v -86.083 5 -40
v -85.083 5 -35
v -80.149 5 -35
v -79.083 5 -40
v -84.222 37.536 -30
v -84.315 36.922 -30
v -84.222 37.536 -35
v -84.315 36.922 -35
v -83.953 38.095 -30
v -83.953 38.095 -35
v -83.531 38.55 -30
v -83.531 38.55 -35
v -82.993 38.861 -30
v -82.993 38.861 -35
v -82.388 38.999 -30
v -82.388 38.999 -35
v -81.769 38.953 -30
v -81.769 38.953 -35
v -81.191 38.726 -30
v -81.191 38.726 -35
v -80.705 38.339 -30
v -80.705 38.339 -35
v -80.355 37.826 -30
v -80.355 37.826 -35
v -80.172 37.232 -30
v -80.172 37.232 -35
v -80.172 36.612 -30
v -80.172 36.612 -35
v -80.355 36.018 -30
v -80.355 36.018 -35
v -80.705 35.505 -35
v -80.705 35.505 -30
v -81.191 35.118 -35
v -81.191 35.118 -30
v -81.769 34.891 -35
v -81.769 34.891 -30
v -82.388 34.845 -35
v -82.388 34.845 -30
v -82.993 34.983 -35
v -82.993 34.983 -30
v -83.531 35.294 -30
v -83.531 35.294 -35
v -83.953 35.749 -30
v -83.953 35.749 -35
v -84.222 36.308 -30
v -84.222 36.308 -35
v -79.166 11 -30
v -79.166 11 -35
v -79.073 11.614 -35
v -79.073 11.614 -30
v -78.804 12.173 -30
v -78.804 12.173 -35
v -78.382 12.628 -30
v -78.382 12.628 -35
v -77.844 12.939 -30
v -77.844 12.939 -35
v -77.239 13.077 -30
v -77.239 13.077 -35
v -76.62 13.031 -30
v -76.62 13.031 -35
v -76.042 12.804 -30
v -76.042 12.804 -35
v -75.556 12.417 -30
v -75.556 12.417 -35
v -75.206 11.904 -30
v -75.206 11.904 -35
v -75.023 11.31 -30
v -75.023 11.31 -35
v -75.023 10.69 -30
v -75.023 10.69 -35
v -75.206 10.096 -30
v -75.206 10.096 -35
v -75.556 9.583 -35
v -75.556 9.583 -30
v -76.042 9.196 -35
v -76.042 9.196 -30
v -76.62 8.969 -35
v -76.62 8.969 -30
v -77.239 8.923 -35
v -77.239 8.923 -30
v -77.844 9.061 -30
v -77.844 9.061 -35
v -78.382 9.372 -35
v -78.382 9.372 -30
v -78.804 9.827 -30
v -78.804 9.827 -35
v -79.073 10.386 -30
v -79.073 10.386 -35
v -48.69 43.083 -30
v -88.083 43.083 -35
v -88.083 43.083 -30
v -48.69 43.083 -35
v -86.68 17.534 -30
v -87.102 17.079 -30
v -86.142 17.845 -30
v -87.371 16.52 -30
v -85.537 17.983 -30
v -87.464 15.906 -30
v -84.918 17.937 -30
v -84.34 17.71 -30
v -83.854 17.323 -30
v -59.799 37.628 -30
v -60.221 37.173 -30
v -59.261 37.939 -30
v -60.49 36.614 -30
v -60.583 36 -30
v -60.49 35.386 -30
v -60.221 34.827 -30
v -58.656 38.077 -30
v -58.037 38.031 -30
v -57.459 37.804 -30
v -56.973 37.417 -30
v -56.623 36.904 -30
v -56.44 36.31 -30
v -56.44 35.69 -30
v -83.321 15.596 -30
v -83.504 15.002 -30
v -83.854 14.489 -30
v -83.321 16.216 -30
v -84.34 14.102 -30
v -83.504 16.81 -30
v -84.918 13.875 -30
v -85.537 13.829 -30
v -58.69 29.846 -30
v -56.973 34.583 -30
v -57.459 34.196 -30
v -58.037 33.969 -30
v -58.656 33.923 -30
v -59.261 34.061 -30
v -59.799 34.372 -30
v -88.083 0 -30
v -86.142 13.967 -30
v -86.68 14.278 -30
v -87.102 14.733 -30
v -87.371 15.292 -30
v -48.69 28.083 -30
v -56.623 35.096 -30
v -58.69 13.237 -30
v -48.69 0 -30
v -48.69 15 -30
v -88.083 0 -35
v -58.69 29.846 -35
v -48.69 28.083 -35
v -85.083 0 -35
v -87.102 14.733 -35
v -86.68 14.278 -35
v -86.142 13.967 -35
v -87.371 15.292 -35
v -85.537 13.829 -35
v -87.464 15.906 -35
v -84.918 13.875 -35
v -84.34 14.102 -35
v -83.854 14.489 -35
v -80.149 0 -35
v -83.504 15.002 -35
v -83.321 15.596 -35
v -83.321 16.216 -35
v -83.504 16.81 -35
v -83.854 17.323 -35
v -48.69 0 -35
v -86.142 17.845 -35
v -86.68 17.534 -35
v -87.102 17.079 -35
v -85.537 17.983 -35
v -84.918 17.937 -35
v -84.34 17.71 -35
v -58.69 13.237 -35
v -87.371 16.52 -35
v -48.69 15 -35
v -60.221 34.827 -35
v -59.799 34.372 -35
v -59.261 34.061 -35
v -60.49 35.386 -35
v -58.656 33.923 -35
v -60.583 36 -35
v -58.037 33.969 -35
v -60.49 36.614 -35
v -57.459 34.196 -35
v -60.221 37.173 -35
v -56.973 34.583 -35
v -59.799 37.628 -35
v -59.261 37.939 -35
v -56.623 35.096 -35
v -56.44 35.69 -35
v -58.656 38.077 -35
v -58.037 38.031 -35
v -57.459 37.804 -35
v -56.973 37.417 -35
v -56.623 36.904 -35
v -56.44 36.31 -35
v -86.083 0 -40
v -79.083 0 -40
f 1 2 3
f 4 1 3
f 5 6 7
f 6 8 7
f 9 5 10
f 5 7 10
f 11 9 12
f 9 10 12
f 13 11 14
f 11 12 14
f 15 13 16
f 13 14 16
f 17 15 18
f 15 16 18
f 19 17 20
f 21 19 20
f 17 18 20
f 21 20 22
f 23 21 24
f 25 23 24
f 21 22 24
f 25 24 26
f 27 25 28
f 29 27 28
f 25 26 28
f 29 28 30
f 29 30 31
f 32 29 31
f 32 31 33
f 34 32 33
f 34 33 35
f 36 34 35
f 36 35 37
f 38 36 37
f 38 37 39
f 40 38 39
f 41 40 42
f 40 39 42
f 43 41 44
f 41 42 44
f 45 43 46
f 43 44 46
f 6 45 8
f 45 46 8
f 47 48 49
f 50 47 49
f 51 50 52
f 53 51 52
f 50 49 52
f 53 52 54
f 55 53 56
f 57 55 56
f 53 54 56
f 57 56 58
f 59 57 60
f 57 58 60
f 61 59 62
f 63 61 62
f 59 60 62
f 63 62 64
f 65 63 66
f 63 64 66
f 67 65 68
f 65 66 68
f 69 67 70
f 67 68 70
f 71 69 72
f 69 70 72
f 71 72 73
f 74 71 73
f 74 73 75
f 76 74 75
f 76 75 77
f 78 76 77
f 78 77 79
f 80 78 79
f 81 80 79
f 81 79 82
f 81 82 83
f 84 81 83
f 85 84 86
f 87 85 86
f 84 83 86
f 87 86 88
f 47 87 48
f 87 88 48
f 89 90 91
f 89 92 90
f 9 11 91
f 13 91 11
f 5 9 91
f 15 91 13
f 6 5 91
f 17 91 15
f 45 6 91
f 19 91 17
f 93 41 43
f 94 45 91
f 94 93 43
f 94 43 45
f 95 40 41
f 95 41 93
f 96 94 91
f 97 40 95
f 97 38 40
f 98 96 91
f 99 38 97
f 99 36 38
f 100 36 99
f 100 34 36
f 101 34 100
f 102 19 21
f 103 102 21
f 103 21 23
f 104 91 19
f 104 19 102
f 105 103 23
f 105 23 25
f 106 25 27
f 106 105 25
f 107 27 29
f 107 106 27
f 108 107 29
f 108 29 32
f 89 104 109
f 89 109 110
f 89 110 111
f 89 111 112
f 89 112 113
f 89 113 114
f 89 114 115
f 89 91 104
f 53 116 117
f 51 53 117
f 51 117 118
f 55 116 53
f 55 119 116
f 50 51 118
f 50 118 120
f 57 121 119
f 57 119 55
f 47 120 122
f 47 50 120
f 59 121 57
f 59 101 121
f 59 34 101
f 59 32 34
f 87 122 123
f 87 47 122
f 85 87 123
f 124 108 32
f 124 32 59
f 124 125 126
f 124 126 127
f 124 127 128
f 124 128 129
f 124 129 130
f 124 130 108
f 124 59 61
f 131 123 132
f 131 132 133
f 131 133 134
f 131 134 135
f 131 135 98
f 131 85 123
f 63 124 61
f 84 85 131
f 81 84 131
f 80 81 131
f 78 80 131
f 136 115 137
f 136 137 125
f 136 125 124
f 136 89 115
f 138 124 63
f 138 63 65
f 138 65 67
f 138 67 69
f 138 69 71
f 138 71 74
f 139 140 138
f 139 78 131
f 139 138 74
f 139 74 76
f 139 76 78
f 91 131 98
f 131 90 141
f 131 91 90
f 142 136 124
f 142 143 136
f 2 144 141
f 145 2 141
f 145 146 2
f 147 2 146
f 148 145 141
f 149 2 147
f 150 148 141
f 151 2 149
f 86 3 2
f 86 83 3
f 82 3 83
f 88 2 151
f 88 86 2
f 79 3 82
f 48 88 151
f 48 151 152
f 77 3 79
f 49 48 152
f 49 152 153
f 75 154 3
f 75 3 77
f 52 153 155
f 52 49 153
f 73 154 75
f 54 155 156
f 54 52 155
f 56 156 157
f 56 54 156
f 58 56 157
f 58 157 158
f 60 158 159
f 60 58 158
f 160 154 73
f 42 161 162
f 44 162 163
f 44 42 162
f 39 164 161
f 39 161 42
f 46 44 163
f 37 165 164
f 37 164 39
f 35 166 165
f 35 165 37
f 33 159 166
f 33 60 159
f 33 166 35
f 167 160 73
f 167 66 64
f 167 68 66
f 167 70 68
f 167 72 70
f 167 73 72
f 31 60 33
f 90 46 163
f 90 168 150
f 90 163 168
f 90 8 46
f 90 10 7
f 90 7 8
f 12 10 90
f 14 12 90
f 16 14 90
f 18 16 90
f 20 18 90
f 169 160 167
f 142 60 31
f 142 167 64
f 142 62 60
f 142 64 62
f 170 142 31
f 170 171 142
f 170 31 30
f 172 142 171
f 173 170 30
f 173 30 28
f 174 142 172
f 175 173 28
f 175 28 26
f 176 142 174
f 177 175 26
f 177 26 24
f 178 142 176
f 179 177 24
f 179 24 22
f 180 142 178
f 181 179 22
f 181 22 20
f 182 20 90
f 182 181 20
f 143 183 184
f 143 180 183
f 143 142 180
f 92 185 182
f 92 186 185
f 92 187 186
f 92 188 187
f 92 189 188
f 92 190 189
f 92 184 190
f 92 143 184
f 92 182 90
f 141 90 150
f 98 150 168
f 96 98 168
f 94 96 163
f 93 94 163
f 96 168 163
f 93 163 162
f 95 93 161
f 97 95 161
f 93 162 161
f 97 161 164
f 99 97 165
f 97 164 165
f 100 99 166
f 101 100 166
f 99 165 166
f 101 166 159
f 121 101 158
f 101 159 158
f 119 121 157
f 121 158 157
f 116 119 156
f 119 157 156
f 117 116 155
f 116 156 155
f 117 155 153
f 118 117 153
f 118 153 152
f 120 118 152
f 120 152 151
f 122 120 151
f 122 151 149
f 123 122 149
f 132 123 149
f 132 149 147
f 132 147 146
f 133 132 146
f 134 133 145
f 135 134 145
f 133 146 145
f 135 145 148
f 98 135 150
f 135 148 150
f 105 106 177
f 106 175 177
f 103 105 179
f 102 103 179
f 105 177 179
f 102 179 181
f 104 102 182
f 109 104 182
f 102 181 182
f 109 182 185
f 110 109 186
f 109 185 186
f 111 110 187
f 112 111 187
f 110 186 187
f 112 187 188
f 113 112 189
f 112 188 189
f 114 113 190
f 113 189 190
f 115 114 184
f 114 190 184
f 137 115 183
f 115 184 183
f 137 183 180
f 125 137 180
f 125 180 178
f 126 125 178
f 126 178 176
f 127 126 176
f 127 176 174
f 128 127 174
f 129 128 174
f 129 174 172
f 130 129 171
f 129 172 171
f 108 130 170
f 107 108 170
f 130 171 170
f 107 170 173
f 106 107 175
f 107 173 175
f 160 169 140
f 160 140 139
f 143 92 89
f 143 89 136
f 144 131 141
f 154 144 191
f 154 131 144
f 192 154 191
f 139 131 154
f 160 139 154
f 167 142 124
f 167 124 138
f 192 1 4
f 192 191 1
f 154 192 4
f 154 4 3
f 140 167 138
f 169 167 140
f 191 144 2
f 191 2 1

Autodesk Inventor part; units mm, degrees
ref_plane "YZ Plane" through (0, 0, 0) normal (1, 0, 0) x (0, 1, 0)
ref_plane "XZ Plane" through (0, 0, 0) normal (0, 1, 0) x (-1, 0, 0)
ref_plane "XY Plane" through (0, 0, 0) normal (0, 0, 1) x (1, 0, 0)
sketch "Sketch1" plane through (0, 0, 0) normal (0, 1, 0) x (-1, 0, 0)
  line L0 (0, 0) -> (0, -35)
  line L1 (0, -35) -> (37, -35)
  line L2 (37, -35) -> (37, -55)
  line L3 (37, -55) -> (48, -55)
  line L4 (48, -55) -> (48, 0)
  line L5 (48, 0) -> (22, 0)
  line L6 (22, 0) -> (22, 0)
  line L7 (22, 0) -> (0, 0)
  dimension "d0" = 35
  dimension "d1" = 37
  dimension "d2" = 20
  dimension "d3" = 11
  dimension "d4" = 55
  dimension "d5" = 26
  dimension "d6" = 0
extrude "Extrusion1" add sketch "Sketch1" along normal blind 50
shell "Shell1" thickness 5 removed faces 3 at (-48, 16.6667, -36.6667) at (-19.6667, 0, -23.3333) at (-19.6667, 50, -23.3333)
sketch "Sketch2" plane through (0, 0, 0) normal (1, 0, 0) x (0, 0, -1)
  line L0 (5, 0) -> (30, 0) projected
  line L1 (5, 0) -> (19, 0)
  line L2 (19, 0) -> (19, 17)
  line L3 (19, 17) -> (5, 17)
  line L4 (5, 17) -> (5, 0)
  point P0 (0, 0)
  dimension "d10" = 17
  dimension "d11" = 0
  dimension "d12" = 11
extrude "Extrusion2" cut sketch "Sketch2" against normal blind 10
sketch "Sketch3" plane through (-48, 0, -55) normal (-1, 0, 0) x (0, 0, 1)
  line L0 (0, 0) -> (0, 50) projected
  line L1 (5, 50) -> (25, 50) projected
  line L2 (0, 0) -> (5, 0)
  line L3 (5, 0) -> (5, 50)
  line L4 (5, 50) -> (0, 50)
  line L5 (0, 50) -> (0, 0)
  point P0 (55, 0)
extrude "Extrusion3" add sketch "Sketch3" along normal blind 15
sketch "Sketch4" plane through (-48, 0, 0) normal (-1, 0, 0) x (0, 0, 1)
  line L0 (-5, 0) -> (0, 0) projected
  line L1 (-5, 0) -> (-5, 50) projected
  line L2 (0, 0) -> (-5, 0)
  line L3 (-5, 0) -> (-5, 50)
  line L4 (-5, 50) -> (0, 50)
  line L5 (0, 50) -> (0, 0)
  point P0 (0, 0)
extrude "Extrusion4" add sketch "Sketch4" along normal blind 15
sketch "Sketch5" plane through (0, 17, -5) normal (0, 0, -1) x (-1, 0, 0)
  circle A0 centre (11.5, -8.5) radius 2.0828
  line L0 (63, -17) -> (0, -17) projected
  line L1 (0, -17) -> (0, 0) projected
  dimension "d19" = 4.1656
  dimension "d20" = 8.5
  dimension "d21" = 11.5
extrude "Extrusion5" cut sketch "Sketch5" against normal blind 15
sketch "Sketch6" plane through (0, 17, -5) normal (0, 0, -1) x (-1, 0, 0)
  circle A0 centre (28.505, 18.46) radius 2.0828
  line L0 (63, -17) -> (0, -17) projected
  line L1 (5, 0) -> (5, 33) projected
  dimension "d24" = 4.1656
  dimension "d25" = 35.46
  dimension "d26" = 23.505
extrude "Extrusion6" cut sketch "Sketch6" against normal blind 15
sketch "Sketch7" plane through (0, 17, -5) normal (0, 0, -1) x (-1, 0, 0)
  circle A0 centre (58.5, 19) radius 2.0828
  line L0 (63, 33) -> (63, -17) projected
  line L1 (5, 33) -> (63, 33) projected
  point P0 (0, -17)
  dimension "d29" = 4.1656
  dimension "d30" = 4.5
  dimension "d31" = 14
extrude "Extrusion7" cut sketch "Sketch7" against normal blind 15
sketch "Sketch13" plane through (0, 0, -35) normal (0, 0, -1) x (-1, 0, 0)
  circle A0 centre (11.5, 8.5) radius 2.0828
  line L0 (0, 0) -> (37, 0) projected
  line L1 (0, 0) -> (0, 50) projected
  dimension "d41" = 4.1656
  dimension "d42" = 8.5
  dimension "d43" = 11.5
extrude "Extrusion9" cut sketch "Sketch13" against normal blind 15
sketch "Sketch14" plane through (-37, 0, -55) normal (0, 0, -1) x (-1, 0, 0)
  circle A0 centre (-8.495, 35.46) radius 2.0828
  line L0 (-37, 0) -> (-37, 50) projected
  line L1 (0, 0) -> (26, 0) projected
  dimension "d46" = 4.1656
  dimension "d47" = 28.505
  dimension "d48" = 35.46
extrude "Extrusion10" cut sketch "Sketch14" against normal blind 15
sketch "Sketch15" plane through (-37, 0, -55) normal (0, 0, -1) x (-1, 0, 0)
  circle A0 centre (21.5, 36) radius 2.0828
  line L0 (0, 0) -> (26, 0) projected
  line L1 (26, 50) -> (26, 0) projected
  point P0 (-37, 0)
  dimension "d51" = 4.1656
  dimension "d52" = 36
  dimension "d53" = 4.5
extrude "Extrusion11" cut sketch "Sketch15" against normal blind 15
sketch "Sketch16" plane through (-42, 0, -30) normal (-1, 0, 0) x (0, 0, 1)
  line L0 (0, 0) -> (-5, 0)
  line L1 (-5, 0) -> (-5, 50)
  line L2 (-5, 50) -> (0, 50)
  line L3 (0, 50) -> (0, 0)
  point P0 (30, 0)
  dimension "d56" = 5
  dimension "d57" = 50
extrude "Extrusion12" add sketch "Sketch16" along normal blind 21
sketch "Sketch17" plane through (-5, 0, -30) normal (0, 0, 1) x (1, 0, 0)
  circle A0 centre (-23.505, 35.46) radius 2.0828
  line L0 (0, 0) -> (0, 50) projected
  line L1 (0, 0) -> (-58, 0) projected
  point P0 (5, 0)
  dimension "d60" = 4.1656
  dimension "d61" = 23.505
  dimension "d62" = 35.46
extrude "Extrusion13" cut sketch "Sketch17" against normal blind 10
sketch "Sketch18" plane through (-42, 0, -35) normal (0, 0, -1) x (-1, 0, 0)
  circle A0 centre (16.5, 36) radius 2.0828
  line L0 (21, 50) -> (21, 0) projected
  line L1 (0, 0) -> (21, 0) projected
  point P0 (-42, 0)
  dimension "d65" = 4.1656
  dimension "d67" = 36
  dimension "d70" = 4.5
extrude "Extrusion14" cut sketch "Sketch18" against normal blind 10
sketch "Sketch20" plane through (-63, 0, 0) normal (-1, 0, 0) x (0, 0, 1)
  line L0 (0, 0) -> (-5, 0) projected
  line L1 (-5, 17) -> (-5, 50) projected
  line L2 (0, 0) -> (-5, 0)
  line L3 (-5, 0) -> (-5, 50)
  line L4 (-5, 50) -> (0, 50)
  line L5 (0, 50) -> (0, 0)
extrude "Extrusion15" add sketch "Sketch20" along normal blind 2.583
sketch "Sketch21" plane through (-63, 0, -30) normal (-1, 0, 0) x (0, 0, 1)
  line L0 (-20, 50) -> (-5, 50) projected
  line L1 (11, 0) -> (0, 0) projected
  line L2 (-5, 50) -> (0, 50)
  line L3 (0, 50) -> (0, 0)
  line L4 (0, 0) -> (-5, 0)
  line L5 (-5, 0) -> (-5, 50)
  point P0 (30, 0)
extrude "Extrusion16" add sketch "Sketch21" along normal blind 2.583
sketch "Sketch22" plane through (-63, 0, -55) normal (-1, 0, 0) x (0, 0, 1)
  line L0 (0, 0) -> (0, 50) projected
  line L1 (5, 0) -> (5, 50) projected
  line L2 (0, 50) -> (5, 50)
  line L3 (5, 50) -> (5, 0)
  line L4 (5, 0) -> (0, 0)
  line L5 (0, 0) -> (0, 50)
  point P0 (55, 0)
extrude "Extrusion17" add sketch "Sketch22" along normal blind 2.583
sketch "Sketch23" plane through (0, 0, 0) normal (0, 0, 1) x (1, 0, 0)
  line L0 (0, 50) -> (-37, 50) projected
  line L1 (-65.583, 50) -> (-65.583, 0) projected
  line L2 (0, 50) -> (-65.583, 50)
  line L3 (-65.583, 50) -> (-65.583, 43.083)
  line L4 (-65.583, 43.083) -> (0, 43.083)
  line L5 (0, 43.083) -> (0, 50)
  point P0 (0, 0)
  dimension "d77" = 6.917
extrude "Extrusion18" cut sketch "Sketch23" against normal blind 100
sketch "Sketch24" plane through (0, 0, -35) normal (0, 0, -1) x (-1, 0, 0)
  line L0 (0, 0) -> (65.583, 0) projected
  line L1 (31.0052, 0) -> (26.0052, 0)
  line L2 (26.0052, 5) -> (31.0052, 5)
  circle A0 centre (28.505, 35.46) radius 2.0828 projected
  line L3 (26.0052, 5) -> (25.0052, 5)
  line L4 (25.0052, 5) -> (26.0052, 0)
  line L5 (31.0052, 5) -> (32.0052, 5)
  line L6 (32.0052, 5) -> (31.0052, 0)
  dimension "d80" = 5
  dimension "d81" = 5
  dimension "d83" = 1
  dimension "d84" = 1
extrude "Extrusion19" cut sketch "Sketch24" against normal blind 100 contours L4 L3 L2 L5 L6 L0
sketch "Sketch25" plane through (-65.583, 0, -55) normal (-1, 0, 0) x (0, 0, 1)
  line L0 (20, 0) -> (0, 0) projected
  line L1 (0, 43.083) -> (20, 43.083) projected
  line L2 (0, 0) -> (5, 0)
  line L3 (5, 0) -> (5, 43.083)
  line L4 (5, 43.083) -> (0, 43.083)
  line L5 (0, 43.083) -> (0, 0)
  point P0 (55, 0)
  dimension "d87" = 5
extrude "Extrusion20" add sketch "Sketch25" along normal blind 22.5
sketch "Sketch28" plane through (-65.583, 0, -30) normal (-1, 0, 0) x (0, 0, 1)
  line L0 (0, 0) -> (-5, 0) projected
  line L1 (-5, 0) -> (-5, 43.083) projected
  line L2 (0, 0) -> (-5, 0)
  line L3 (-5, 0) -> (-5, 43.083)
  line L4 (-5, 43.083) -> (0, 43.083)
  line L5 (0, 43.083) -> (0, 0)
  point P0 (30, 0)
extrude "Extrusion23" add sketch "Sketch28" along normal blind 22.5
sketch "Sketch26" plane through (-37, 0, -55) normal (0, 0, -1) x (-1, 0, 0)
  circle A0 centre (45.232, 36.922) radius 2.0828
  line L0 (51.083, 43.083) -> (51.083, 0) projected
  line L1 (51.083, 43.083) -> (0, 43.083) projected
  point P0 (-37, 0)
  dimension "d90" = 4.1656
  dimension "d91" = 5.851
  dimension "d92" = 6.161
extrude "Extrusion21" cut sketch "Sketch26" against normal blind 25
sketch "Sketch27" plane through (-37, 0, -55) normal (0, 0, -1) x (-1, 0, 0)
  circle A0 centre (48.381, 15.906) radius 2.0828
  line L0 (51.083, 43.083) -> (51.083, 0) projected
  line L1 (0, 0) -> (51.083, 0) projected
  point P0 (-37, 0)
  dimension "d95" = 4.1656
  dimension "d96" = 2.702
  dimension "d97" = 15.906
extrude "Extrusion22" cut sketch "Sketch27" against normal blind 25
sketch "Sketch29" plane through (-42, 0, -35) normal (0, 0, -1) x (-1, 0, 0)
  circle A0 centre (43.381, 15.906) radius 2.0828 projected
  arc A1 (46.083, 19.6075) -> (46.083, 12.2045) centre (43.381, 15.906) ccw
  line L0 (46.083, 43.083) -> (46.083, 0) projected
  line L1 (46.083, 19.6075) -> (46.083, 12.2045)
  point P0 (-42, 0)
  dimension "d102" = 2.5
extrude "Extrusion24" add sketch "Sketch29" along normal up to next
sketch "Sketch30" plane through (-88.083, 0, -55) normal (-1, 0, 0) x (0, 0, 1)
  line L0 (9, 19.6075) -> (21, 19.6075)
  line L1 (21, 19.6075) -> (21, 5)
  line L2 (21, 5) -> (9, 5)
  line L3 (9, 5) -> (9, 19.6075)
  line L4 (0, 43.083) -> (0, 0) projected
  line L5 (25, 0) -> (25, 43.083) projected
  line L6 (0, 0) -> (5, 0) projected
  line L7 (20, 19.6075) -> (5, 19.6075) projected
  point P0 (55, 0)
  dimension "d105" = 9
  dimension "d106" = 4
  dimension "d107" = 5
  dimension "d108" = 0
extrude "Extrusion25" add sketch "Sketch30" along normal blind 30
sketch "Sketch31" plane through (-88.083, 5, -34) normal (0, 0, 1) x (1, 0, 0)
  circle A0 centre (-23.917, 4) radius 2.0828
  line L0 (-30, 0) -> (-30, 14.6075) projected
  line L1 (0, 0) -> (-30, 0) projected
  point P0 (88.083, -5)
  dimension "d111" = 4.1656
  dimension "d112" = 6.083
  dimension "d113" = 4
extrude "Extrusion26" cut sketch "Sketch31" against normal blind 30
sketch "Sketch33" plane through (-88.083, 5, -34) normal (0, 0, 1) x (1, 0, 0)
  circle A0 centre (-23.917, 4) radius 2.0828 projected
  arc A1 (-25.0228, 9.9816) -> (-30, 4) centre (-23.917, 4) ccw
  line L0 (-30, 14.6075) -> (-30, 0) projected
  line L1 (-30, 0) -> (-30, 14.6075) projected
  line L2 (0, 14.6075) -> (-30, 14.6075) projected
  line L3 (-30, 4) -> (-30, 14.6075)
  line L4 (0, 14.6075) -> (-30, 14.6075) projected
  line L5 (-30, 14.6075) -> (0, 14.6075)
  line L6 (0, 14.6075) -> (-25.0228, 9.9816)
  point P0 (88.083, -5)
extrude "Extrusion27" cut sketch "Sketch33" against normal blind 30 contours A1 L0 L2 L6
sketch "Sketch34" plane through (-118.083, 5, -34) normal (0, 0, 1) x (1, 0, 0)
  circle A0 centre (6.083, 4) radius 2.0828 projected
  line L0 (0, 0) -> (0, 4) projected
  arc A1 (0, 4) -> (1.5001, 0) centre (6.083, 4) ccw
  line L1 (30, 0) -> (0, 0) projected
  line L2 (1.5001, 0) -> (0, 0)
  arc A2 (4.9772, 9.9816) -> (0, 4) centre (6.083, 4) ccw projected
  line L3 (0, 0) -> (0, 4)
  point P0 (118.083, -5)
extrude "Extrusion28" cut sketch "Sketch34" against normal blind 30 contours L0 A1 L1
sketch "Sketch35" plane through (-88.083, 5, -46) normal (0, -1, 0) x (1, 0, 0)
  line L0 (0, 12) -> (0, 11) projected
  line L1 (0, 0) -> (-28.4999, 0) projected
  line L2 (0, 11) -> (0, 0)
  line L3 (0, 0) -> (7.2848, 11)
  line L4 (7.2848, 11) -> (7.2848, -4) projected
  line L5 (0, 11) -> (7.2848, 11)
  line L6 (46.083, 11) -> (0, 11) projected
  point P0 (88.083, 46)
extrude "Extrusion29" add sketch "Sketch35" against normal up to next
sketch "Sketch36" plane through (0, 0, 0) normal (1, 0, 0) x (0, 0, -1)
  line L0 (30, 43.083) -> (35, 43.083) projected
  line L1 (0, 0) -> (5, 0) projected
  line L2 (30, 43.083) -> (0, 43.083)
  line L3 (0, 43.083) -> (0, 0)
  line L4 (0, 0) -> (30, 0)
  line L5 (30, 0) -> (30, 43.083)
extrude "Extrusion30" cut sketch "Sketch36" against normal through all
sketch "Sketch37" plane through (0, 43.083, -35) normal (0, 0, -1) x (-1, 0, 0)
  line L0 (10, -8.694) -> (10, -17.3883)
  line L1 (10, -17.3883) -> (5, -16.5067)
  line L2 (10, -8.694) -> (5, -9.5756)
  line L3 (10, -8.694) -> (15.0771, -8.694) construction
  line L4 (5, -9.5756) -> (5, -16.5067)
  line L5 (0, -43.083) -> (0, 0) projected
  line L6 (0, -43.083) -> (26.0052, -43.083) projected
  dimension "d124" = 8.6943
  dimension "d125" = 80
  dimension "d126" = 170
  dimension "d127" = 5
  dimension "d130" = 5
  dimension "d131" = 34.389
extrude "Extrusion31" cut sketch "Sketch37" against normal blind 10
sketch "Sketch38" plane through (-37, 0, -35) normal (1, 0, 0) x (0, 0, -1)
  line L0 (20, 43.083) -> (20, 0) projected
  line L1 (0, 0) -> (20, 0)
  line L2 (20, 0) -> (20, 43.083)
  line L3 (20, 43.083) -> (0, 43.083)
  line L4 (0, 43.083) -> (0, 0)
  point P0 (-35, 0)
extrude "Extrusion32" cut sketch "Sketch38" against normal through all
sketch "Sketch39" plane through (0, 0, -30) normal (1, 0, 0) x (0, 0, -1)
  line L0 (10, 34.389) -> (10, 25.6947)
  line L1 (10, 25.6947) -> (5, 26.5763)
  line L2 (10, 34.389) -> (5, 33.5074)
  line L3 (10, 34.389) -> (15.0771, 34.389) construction
  line L4 (5, 33.5074) -> (5, 26.5763)
  line L5 (5, 0) -> (5, 43.083) projected
  point P0 (5, 33.5074)
  dimension "d136" = 8.6943
  dimension "d137" = 80
  dimension "d138" = 170
  dimension "d139" = 5
  dimension "d140" = 0
  dimension "d141" = 8.694
extrude "Extrusion33" add sketch "Sketch39" against normal blind 37
sketch "Sketch40" plane through (0, 0, -30) normal (1, 0, 0) x (0, 0, -1)
  line L0 (5, 38.0828) -> (5, 33.9172) projected
  line L1 (5, 36.5278) -> (10.9453, 36.5278)
  line L2 (10.9453, 36.5278) -> (10.9453, 22.5092)
  line L3 (10.9453, 22.5092) -> (5, 22.5092)
  line L4 (5, 22.5092) -> (5, 36.5278)
  point P0 (-30, 0)
extrude "Extrusion34" cut sketch "Sketch40" against normal blind 32
sketch "Sketch41" plane through (0, 0, -35) normal (0, 0, -1) x (-1, 0, 0)
  line L0 (0, 0) -> (5, 0)
  line L1 (5, 0) -> (5, 45.0451)
  line L2 (5, 45.0451) -> (0, 45.0451)
  line L3 (0, 45.0451) -> (0, 0)
  dimension "d146" = 5
extrude "Extrusion35" cut sketch "Sketch41" against normal blind 27
sketch "Sketch43" plane through (-32, 0, -30) normal (1, 0, 0) x (0, 0, -1)
  line L0 (10, 16.9997) -> (10, 8.3054)
  line L1 (10, 8.3054) -> (5, 9.187)
  line L2 (10, 16.9997) -> (5, 16.118)
  line L3 (10, 16.9997) -> (15.0771, 16.9997) construction
  line L4 (5, 16.118) -> (5, 9.187)
  line L5 (10, 34.389) -> (10, 25.6947) projected
  point P0 (5, 0)
  dimension "d149" = 8.6943
  dimension "d150" = 80
  dimension "d151" = 170
  dimension "d152" = 5
  dimension "d153" = 0
  dimension "d154" = 9.187
extrude "Extrusion36" add sketch "Sketch43" against normal blind 5
sketch "Sketch44" plane through (-25.0052, 5, -35) normal (0, 0, -1) x (-1, 0, 0)
  line L0 (23.6844, 38.083) -> (23.6844, 23.083)
  line L1 (23.6844, 23.083) -> (33.6844, 24.8463)
  line L2 (33.6844, 24.8463) -> (33.6844, 8.2367)
  line L3 (33.6844, 8.2367) -> (23.6844, 10)
  line L4 (23.6844, 10) -> (23.6844, -5)
  line L5 (6, -5) -> (63.0778, -5) projected
  line L6 (63.0778, 38.083) -> (-20.0052, 38.083) projected
  line L7 (23.6844, 38.083) -> (96.1703, 54.1884)
  line L8 (96.1703, 54.1884) -> (94.0332, -32.3639)
  line L9 (94.0332, -32.3639) -> (23.6844, -5)
  point P0 (-25.0052, -5)
  dimension "d157" = 15
  dimension "d158" = 15
  dimension "d159" = 13.083
  dimension "d160" = 80
  dimension "d161" = 80
  dimension "d162" = 10
extrude "Extrusion37" cut sketch "Sketch44" against normal blind 10 keep common part
sketch "Sketch45" plane through (-88.083, 0, -35) normal (0, 0, -1) x (-1, 0, 0)
  line L0 (-39.3934, 0) -> (0, 0) projected
  line L1 (0, 0) -> (31.1336, 0)
  line L2 (31.1336, 0) -> (31.1336, 42.5883)
  line L3 (31.1336, 42.5883) -> (0, 42.5883)
  line L4 (0, 42.5883) -> (0, 0)
  point P0 (-88.083, 0)
extrude "Extrusion38" cut sketch "Sketch45" against normal blind 10
sketch "Sketch46" plane through (-88.083, 0, -35) normal (0, 0, -1) x (-1, 0, 0)
  circle A0 centre (-11, 11) radius 2.0828
  line L0 (-39.3934, 0) -> (0, 0) projected
  line L1 (0, 43.083) -> (0, 0) projected
  point P0 (-88.083, 0)
  dimension "d167" = 4.1656
  dimension "d168" = 11
  dimension "d169" = 11
extrude "Extrusion39" cut sketch "Sketch46" against normal blind 10
sketch "Sketch47" plane through (0, 0, 0) normal (0, -1, 0) x (1, 0, 0)
  line L0 (-87.4638, -35) -> (-83.2982, -35) projected
  line L1 (-85.083, -35) -> (-86.083, -40)
  line L2 (-86.083, -40) -> (-79.083, -40)
  line L3 (-80.1492, -35) -> (-84.3148, -35) projected
  line L4 (-79.083, -40) -> (-80.1492, -35)
  line L5 (-80.1492, -35) -> (-85.083, -35)
  line L6 (-48.6896, -35) -> (-88.083, -35) projected
  point P0 (0, 0)
  dimension "d172" = 3
  dimension "d173" = 1
  dimension "d174" = 7
  dimension "d175" = 5
extrude "Extrusion40" add sketch "Sketch47" against normal blind 5
properties part number "Frame VG01-06"
